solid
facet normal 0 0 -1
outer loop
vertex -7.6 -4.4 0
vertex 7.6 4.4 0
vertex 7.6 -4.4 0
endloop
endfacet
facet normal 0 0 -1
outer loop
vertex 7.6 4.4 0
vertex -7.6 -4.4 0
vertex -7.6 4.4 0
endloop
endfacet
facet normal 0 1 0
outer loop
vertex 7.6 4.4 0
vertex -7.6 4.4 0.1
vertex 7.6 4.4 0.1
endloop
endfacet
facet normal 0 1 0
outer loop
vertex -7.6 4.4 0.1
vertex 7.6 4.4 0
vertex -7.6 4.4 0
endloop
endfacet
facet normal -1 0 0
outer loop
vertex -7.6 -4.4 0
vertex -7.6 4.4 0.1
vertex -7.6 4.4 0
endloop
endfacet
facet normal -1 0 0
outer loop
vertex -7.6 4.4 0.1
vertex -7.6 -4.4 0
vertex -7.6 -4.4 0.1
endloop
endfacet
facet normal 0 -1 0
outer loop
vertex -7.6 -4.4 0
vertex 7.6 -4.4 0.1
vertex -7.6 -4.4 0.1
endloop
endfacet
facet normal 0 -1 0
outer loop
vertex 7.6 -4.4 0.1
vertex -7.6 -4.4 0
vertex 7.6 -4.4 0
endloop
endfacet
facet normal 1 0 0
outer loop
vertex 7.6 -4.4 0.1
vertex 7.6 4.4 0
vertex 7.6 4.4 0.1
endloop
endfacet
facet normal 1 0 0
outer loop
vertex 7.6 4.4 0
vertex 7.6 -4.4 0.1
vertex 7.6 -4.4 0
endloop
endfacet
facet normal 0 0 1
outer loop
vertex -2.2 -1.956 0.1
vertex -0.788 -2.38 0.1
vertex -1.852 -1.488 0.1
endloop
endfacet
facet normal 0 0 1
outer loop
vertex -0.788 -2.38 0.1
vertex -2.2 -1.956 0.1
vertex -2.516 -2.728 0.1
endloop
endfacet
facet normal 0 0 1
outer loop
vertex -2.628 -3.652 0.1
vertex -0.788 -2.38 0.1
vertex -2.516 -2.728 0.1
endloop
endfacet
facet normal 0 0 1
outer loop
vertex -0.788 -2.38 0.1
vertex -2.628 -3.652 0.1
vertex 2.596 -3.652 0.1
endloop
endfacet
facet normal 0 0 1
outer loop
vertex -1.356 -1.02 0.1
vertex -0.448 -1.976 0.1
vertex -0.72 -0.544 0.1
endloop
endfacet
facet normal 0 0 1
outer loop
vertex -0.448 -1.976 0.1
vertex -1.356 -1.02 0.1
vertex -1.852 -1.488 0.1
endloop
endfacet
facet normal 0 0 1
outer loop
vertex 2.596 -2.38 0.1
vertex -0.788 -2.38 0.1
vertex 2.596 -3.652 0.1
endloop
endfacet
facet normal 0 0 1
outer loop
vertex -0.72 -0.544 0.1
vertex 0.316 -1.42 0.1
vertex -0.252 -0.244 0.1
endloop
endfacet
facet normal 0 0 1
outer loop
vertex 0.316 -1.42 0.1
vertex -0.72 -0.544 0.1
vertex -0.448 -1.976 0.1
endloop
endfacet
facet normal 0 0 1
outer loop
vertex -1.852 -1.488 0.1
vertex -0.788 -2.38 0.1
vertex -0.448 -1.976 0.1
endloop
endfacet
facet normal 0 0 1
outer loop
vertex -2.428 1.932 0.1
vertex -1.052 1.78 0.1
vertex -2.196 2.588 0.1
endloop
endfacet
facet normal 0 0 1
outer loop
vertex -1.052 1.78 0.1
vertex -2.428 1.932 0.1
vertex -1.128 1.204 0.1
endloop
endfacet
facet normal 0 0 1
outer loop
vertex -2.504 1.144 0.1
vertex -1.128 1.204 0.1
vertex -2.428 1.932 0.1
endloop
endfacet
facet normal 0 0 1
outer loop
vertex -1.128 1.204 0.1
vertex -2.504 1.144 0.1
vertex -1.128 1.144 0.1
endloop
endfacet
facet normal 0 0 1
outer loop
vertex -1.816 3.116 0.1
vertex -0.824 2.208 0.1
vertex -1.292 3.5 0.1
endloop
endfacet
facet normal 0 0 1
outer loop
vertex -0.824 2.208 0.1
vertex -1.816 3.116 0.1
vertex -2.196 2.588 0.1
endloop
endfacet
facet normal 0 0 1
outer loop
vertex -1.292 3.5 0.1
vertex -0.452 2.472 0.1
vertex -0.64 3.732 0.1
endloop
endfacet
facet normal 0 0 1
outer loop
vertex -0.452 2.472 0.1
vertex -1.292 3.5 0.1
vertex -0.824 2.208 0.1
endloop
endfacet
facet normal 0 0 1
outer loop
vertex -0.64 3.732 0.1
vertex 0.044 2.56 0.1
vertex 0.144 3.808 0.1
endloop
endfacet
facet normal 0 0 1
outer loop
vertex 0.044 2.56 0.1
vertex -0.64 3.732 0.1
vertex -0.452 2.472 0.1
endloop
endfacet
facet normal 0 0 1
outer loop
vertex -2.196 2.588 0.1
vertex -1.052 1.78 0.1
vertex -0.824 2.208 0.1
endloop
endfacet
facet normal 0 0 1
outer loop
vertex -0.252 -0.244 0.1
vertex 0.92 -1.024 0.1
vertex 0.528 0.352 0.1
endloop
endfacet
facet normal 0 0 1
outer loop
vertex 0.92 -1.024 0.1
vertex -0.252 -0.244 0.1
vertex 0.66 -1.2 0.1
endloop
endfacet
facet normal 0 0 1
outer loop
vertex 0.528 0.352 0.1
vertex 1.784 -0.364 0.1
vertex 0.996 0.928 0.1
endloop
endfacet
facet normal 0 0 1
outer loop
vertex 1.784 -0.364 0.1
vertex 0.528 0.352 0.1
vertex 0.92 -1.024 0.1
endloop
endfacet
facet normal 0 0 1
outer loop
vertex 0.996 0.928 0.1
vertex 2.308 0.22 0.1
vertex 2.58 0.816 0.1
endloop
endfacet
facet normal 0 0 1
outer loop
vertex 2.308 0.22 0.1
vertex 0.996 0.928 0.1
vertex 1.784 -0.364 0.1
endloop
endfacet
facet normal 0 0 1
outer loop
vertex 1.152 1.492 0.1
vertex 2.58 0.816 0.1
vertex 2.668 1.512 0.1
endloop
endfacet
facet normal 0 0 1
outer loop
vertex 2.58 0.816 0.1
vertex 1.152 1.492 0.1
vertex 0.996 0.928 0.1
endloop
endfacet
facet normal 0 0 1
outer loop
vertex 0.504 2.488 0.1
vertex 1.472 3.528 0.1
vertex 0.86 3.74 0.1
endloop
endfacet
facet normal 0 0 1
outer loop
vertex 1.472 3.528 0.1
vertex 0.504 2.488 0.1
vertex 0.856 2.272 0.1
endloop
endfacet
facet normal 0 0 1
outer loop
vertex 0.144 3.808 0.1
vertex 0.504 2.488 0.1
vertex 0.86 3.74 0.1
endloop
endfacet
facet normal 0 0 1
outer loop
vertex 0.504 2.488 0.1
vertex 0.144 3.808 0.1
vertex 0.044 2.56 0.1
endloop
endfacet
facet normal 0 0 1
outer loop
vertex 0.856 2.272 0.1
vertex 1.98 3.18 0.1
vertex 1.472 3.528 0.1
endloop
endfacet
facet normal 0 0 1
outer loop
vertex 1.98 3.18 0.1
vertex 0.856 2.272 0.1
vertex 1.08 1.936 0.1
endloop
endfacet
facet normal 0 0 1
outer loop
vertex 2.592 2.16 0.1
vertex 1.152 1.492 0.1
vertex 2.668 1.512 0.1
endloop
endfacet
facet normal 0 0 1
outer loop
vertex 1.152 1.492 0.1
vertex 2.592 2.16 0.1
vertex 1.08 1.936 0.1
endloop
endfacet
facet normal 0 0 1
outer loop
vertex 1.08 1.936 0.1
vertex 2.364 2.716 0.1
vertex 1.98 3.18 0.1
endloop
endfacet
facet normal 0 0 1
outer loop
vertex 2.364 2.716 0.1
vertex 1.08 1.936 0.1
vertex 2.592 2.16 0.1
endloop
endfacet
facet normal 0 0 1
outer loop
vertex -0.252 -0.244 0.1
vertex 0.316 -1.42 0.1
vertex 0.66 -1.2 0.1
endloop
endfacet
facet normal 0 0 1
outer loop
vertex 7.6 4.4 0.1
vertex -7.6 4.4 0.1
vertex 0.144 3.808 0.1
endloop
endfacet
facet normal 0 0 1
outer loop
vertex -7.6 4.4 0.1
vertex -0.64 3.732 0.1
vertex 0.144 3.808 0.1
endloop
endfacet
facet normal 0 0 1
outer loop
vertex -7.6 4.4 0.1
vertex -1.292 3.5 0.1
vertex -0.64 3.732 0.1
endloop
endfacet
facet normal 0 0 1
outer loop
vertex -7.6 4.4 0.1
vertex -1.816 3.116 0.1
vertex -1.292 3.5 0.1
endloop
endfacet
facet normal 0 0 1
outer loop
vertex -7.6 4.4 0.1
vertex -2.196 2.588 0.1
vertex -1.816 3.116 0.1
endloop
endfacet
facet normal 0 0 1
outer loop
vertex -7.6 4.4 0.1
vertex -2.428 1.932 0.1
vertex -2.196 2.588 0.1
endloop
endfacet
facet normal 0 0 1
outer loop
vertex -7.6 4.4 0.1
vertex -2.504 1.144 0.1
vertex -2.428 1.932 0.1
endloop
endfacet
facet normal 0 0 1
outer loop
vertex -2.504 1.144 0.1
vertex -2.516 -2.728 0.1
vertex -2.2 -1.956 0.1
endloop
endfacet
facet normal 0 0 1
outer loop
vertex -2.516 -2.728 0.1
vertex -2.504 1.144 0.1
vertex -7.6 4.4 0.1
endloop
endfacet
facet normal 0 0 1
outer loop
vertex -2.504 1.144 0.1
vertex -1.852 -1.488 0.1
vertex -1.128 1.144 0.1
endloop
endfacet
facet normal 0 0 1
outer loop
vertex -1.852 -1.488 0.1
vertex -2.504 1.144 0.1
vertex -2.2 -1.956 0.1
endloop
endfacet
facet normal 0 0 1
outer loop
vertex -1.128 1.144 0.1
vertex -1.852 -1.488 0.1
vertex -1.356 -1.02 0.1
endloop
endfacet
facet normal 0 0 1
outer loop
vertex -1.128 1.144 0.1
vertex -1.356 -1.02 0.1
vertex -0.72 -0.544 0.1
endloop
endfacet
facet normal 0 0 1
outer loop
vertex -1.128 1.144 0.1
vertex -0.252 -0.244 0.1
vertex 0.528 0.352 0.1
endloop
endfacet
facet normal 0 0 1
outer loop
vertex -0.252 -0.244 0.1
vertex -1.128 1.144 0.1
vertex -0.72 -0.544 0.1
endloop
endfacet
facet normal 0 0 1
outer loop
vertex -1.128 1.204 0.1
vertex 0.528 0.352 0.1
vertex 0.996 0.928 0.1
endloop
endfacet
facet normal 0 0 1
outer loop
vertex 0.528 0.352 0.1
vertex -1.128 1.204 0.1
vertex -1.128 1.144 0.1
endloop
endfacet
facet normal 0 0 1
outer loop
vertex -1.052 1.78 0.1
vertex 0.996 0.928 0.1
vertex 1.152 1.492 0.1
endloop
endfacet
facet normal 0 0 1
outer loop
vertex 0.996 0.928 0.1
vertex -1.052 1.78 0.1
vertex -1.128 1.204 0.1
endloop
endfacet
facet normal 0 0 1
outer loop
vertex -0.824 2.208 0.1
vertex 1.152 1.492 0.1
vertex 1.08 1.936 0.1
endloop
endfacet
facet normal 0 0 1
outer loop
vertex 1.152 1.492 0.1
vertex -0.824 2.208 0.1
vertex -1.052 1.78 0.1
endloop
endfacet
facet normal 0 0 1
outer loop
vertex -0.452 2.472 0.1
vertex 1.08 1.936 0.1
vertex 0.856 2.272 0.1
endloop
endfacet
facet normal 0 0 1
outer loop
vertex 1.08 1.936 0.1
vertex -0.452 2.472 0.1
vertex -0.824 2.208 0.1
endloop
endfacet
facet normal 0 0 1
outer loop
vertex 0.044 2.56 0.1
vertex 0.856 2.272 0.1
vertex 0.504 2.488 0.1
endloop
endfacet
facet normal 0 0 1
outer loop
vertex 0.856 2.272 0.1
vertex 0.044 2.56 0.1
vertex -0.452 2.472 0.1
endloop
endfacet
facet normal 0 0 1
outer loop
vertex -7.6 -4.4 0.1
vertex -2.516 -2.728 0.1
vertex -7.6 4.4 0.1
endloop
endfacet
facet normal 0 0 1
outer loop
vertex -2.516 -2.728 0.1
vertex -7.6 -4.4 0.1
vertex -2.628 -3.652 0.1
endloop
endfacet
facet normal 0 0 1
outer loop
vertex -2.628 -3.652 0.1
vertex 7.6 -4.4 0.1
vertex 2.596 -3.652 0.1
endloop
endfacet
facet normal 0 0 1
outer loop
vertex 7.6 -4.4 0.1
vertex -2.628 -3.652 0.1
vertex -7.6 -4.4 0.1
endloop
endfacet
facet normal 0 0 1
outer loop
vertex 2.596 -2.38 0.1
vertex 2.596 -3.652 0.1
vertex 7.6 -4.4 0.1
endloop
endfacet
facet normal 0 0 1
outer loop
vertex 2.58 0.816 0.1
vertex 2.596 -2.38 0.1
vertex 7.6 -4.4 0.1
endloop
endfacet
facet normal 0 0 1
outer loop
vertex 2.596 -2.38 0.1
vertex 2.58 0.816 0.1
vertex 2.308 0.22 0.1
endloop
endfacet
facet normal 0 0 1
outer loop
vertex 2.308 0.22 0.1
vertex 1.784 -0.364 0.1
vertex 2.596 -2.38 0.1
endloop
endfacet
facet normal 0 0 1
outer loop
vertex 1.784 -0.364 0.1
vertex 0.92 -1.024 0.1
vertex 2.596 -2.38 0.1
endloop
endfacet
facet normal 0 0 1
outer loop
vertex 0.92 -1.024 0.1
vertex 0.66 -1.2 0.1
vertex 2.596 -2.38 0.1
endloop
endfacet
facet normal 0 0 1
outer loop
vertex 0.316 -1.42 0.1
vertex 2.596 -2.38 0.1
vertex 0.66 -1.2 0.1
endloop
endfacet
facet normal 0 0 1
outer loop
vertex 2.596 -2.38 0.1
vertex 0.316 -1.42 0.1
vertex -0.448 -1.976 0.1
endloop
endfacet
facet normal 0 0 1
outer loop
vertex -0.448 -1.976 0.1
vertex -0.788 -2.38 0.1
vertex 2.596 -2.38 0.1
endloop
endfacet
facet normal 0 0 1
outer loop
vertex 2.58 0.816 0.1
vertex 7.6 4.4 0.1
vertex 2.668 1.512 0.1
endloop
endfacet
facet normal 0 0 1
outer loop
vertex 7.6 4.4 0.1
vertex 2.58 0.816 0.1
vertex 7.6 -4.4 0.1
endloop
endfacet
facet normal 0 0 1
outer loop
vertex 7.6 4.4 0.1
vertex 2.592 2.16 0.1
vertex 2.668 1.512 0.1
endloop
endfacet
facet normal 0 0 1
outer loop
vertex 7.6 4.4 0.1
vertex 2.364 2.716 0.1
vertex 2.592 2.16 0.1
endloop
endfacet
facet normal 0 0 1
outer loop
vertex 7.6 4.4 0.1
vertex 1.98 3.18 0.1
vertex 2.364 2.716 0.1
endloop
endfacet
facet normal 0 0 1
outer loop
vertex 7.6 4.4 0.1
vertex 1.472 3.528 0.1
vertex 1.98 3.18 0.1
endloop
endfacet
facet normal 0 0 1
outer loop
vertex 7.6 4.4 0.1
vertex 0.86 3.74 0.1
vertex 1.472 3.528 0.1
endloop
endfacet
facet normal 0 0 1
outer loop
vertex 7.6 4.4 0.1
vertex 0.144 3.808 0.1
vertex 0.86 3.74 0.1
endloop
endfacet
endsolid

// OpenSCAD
// file: s/004452cs02.scad
use <../../lib.scad>
function ldraw_lib__s__004452cs02() = [
// 0 ~Sticker  1.1 x  1.9 with Number "2" - Background
// 0 Name: s\004452cs02.dat
// 0 Author: Takeshi Takahashi [RainbowDolphin]
// 0 !LDRAW_ORG Subpart UPDATE 2022-04
// 0 !LICENSE Licensed under CC BY 2.0 and CC BY 4.0 : see CAreadme.txt
// 
// 0 BFC CERTIFY CCW
  [0,"BFC","CERTIFY"],
  [0,"BFC","CCW"],
// 
// 0 !HISTORY 2022-07-18 [PTadmin] Official Update 2022-04
// 
// 
// 3 16 19 -.25 11 -19 -.25 11 .36 -.25 9.52
  [3,16,19,-.25,11,-19,-.25,11,.36,-.25,9.52],
// 3 16 -19 -.25 11 -1.6 -.25 9.33 .36 -.25 9.52
  [3,16,-19,-.25,11,-1.6,-.25,9.33,.36,-.25,9.52],
// 3 16 -19 -.25 11 -3.23 -.25 8.75 -1.6 -.25 9.33
  [3,16,-19,-.25,11,-3.23,-.25,8.75,-1.6,-.25,9.33],
// 3 16 -19 -.25 11 -4.54 -.25 7.79 -3.23 -.25 8.75
  [3,16,-19,-.25,11,-4.54,-.25,7.79,-3.23,-.25,8.75],
// 3 16 -19 -.25 11 -5.49 -.25 6.47 -4.54 -.25 7.79
  [3,16,-19,-.25,11,-5.49,-.25,6.47,-4.54,-.25,7.79],
// 3 16 -19 -.25 11 -6.07 -.25 4.83 -5.49 -.25 6.47
  [3,16,-19,-.25,11,-6.07,-.25,4.83,-5.49,-.25,6.47],
// 3 16 -19 -.25 11 -6.26 -.25 2.86 -6.07 -.25 4.83
  [3,16,-19,-.25,11,-6.26,-.25,2.86,-6.07,-.25,4.83],
// 4 16 -6.26 -.25 2.86 -19 -.25 11 -6.29 -.25 -6.82 -5.5 -.25 -4.89
  [4,16,-6.26,-.25,2.86,-19,-.25,11,-6.29,-.25,-6.82,-5.5,-.25,-4.89],
// 4 16 -6.26 -.25 2.86 -5.5 -.25 -4.89 -4.63 -.25 -3.72 -2.82 -.25 2.86
  [4,16,-6.26,-.25,2.86,-5.5,-.25,-4.89,-4.63,-.25,-3.72,-2.82,-.25,2.86],
// 3 16 -2.82 -.25 2.86 -4.63 -.25 -3.72 -3.39 -.25 -2.55
  [3,16,-2.82,-.25,2.86,-4.63,-.25,-3.72,-3.39,-.25,-2.55],
// 3 16 -2.82 -.25 2.86 -3.39 -.25 -2.55 -1.8 -.25 -1.36
  [3,16,-2.82,-.25,2.86,-3.39,-.25,-2.55,-1.8,-.25,-1.36],
// 4 16 -2.82 -.25 2.86 -1.8 -.25 -1.36 -.63 -.25 -.61 1.32 -.25 .88
  [4,16,-2.82,-.25,2.86,-1.8,-.25,-1.36,-.63,-.25,-.61,1.32,-.25,.88],
// 4 16 -2.82 -.25 3.01 -2.82 -.25 2.86 1.32 -.25 .88 2.49 -.25 2.32
  [4,16,-2.82,-.25,3.01,-2.82,-.25,2.86,1.32,-.25,.88,2.49,-.25,2.32],
// 4 16 -2.63 -.25 4.45 -2.82 -.25 3.01 2.49 -.25 2.32 2.88 -.25 3.73
  [4,16,-2.63,-.25,4.45,-2.82,-.25,3.01,2.49,-.25,2.32,2.88,-.25,3.73],
// 4 16 -2.06 -.25 5.52 -2.63 -.25 4.45 2.88 -.25 3.73 2.7 -.25 4.84
  [4,16,-2.06,-.25,5.52,-2.63,-.25,4.45,2.88,-.25,3.73,2.7,-.25,4.84],
// 4 16 -1.13 -.25 6.18 -2.06 -.25 5.52 2.7 -.25 4.84 2.14 -.25 5.68
  [4,16,-1.13,-.25,6.18,-2.06,-.25,5.52,2.7,-.25,4.84,2.14,-.25,5.68],
// 4 16 .11 -.25 6.4 -1.13 -.25 6.18 2.14 -.25 5.68 1.26 -.25 6.22
  [4,16,.11,-.25,6.4,-1.13,-.25,6.18,2.14,-.25,5.68,1.26,-.25,6.22],
// 4 16 -6.57 -.25 -9.13 -6.29 -.25 -6.82 -19 -.25 11 -19 -.25 -11
  [4,16,-6.57,-.25,-9.13,-6.29,-.25,-6.82,-19,-.25,11,-19,-.25,-11],
// 4 16 6.49 -.25 -9.13 -6.57 -.25 -9.13 -19 -.25 -11 19 -.25 -11
  [4,16,6.49,-.25,-9.13,-6.57,-.25,-9.13,-19,-.25,-11,19,-.25,-11],
// 3 16 6.49 -.25 -5.95 6.49 -.25 -9.13 19 -.25 -11
  [3,16,6.49,-.25,-5.95,6.49,-.25,-9.13,19,-.25,-11],
// 4 16 6.49 -.25 -5.95 19 -.25 -11 6.45 -.25 2.04 5.77 -.25 .55
  [4,16,6.49,-.25,-5.95,19,-.25,-11,6.45,-.25,2.04,5.77,-.25,.55],
// 3 16 5.77 -.25 .55 4.46 -.25 -.91 6.49 -.25 -5.95
  [3,16,5.77,-.25,.55,4.46,-.25,-.91,6.49,-.25,-5.95],
// 3 16 4.46 -.25 -.91 2.3 -.25 -2.56 6.49 -.25 -5.95
  [3,16,4.46,-.25,-.91,2.3,-.25,-2.56,6.49,-.25,-5.95],
// 3 16 2.3 -.25 -2.56 1.65 -.25 -3 6.49 -.25 -5.95
  [3,16,2.3,-.25,-2.56,1.65,-.25,-3,6.49,-.25,-5.95],
// 4 16 6.49 -.25 -5.95 1.65 -.25 -3 .79 -.25 -3.55 -1.12 -.25 -4.94
  [4,16,6.49,-.25,-5.95,1.65,-.25,-3,.79,-.25,-3.55,-1.12,-.25,-4.94],
// 3 16 -1.12 -.25 -4.94 -1.97 -.25 -5.95 6.49 -.25 -5.95
  [3,16,-1.12,-.25,-4.94,-1.97,-.25,-5.95,6.49,-.25,-5.95],
// 4 16 6.45 -.25 2.04 19 -.25 -11 19 -.25 11 6.67 -.25 3.78
  [4,16,6.45,-.25,2.04,19,-.25,-11,19,-.25,11,6.67,-.25,3.78],
// 3 16 19 -.25 11 6.48 -.25 5.4 6.67 -.25 3.78
  [3,16,19,-.25,11,6.48,-.25,5.4,6.67,-.25,3.78],
// 3 16 19 -.25 11 5.91 -.25 6.79 6.48 -.25 5.4
  [3,16,19,-.25,11,5.91,-.25,6.79,6.48,-.25,5.4],
// 3 16 19 -.25 11 4.95 -.25 7.95 5.91 -.25 6.79
  [3,16,19,-.25,11,4.95,-.25,7.95,5.91,-.25,6.79],
// 3 16 19 -.25 11 3.68 -.25 8.82 4.95 -.25 7.95
  [3,16,19,-.25,11,3.68,-.25,8.82,4.95,-.25,7.95],
// 3 16 19 -.25 11 2.15 -.25 9.35 3.68 -.25 8.82
  [3,16,19,-.25,11,2.15,-.25,9.35,3.68,-.25,8.82],
// 3 16 19 -.25 11 .36 -.25 9.52 2.15 -.25 9.35
  [3,16,19,-.25,11,.36,-.25,9.52,2.15,-.25,9.35],
];
makepoly(ldraw_lib__s__004452cs02(), line=0.2);
// file: s/004452cs01.scad
use <../../lib.scad>
function ldraw_lib__s__004452cs01() = [
// 0 ~Sticker  1.1 x  1.9 with Number "2" - Type Face
// 0 Name: s\004452cs01.dat
// 0 Author: Takeshi Takahashi [RainbowDolphin]
// 0 !LDRAW_ORG Subpart UPDATE 2022-04
// 0 !LICENSE Licensed under CC BY 2.0 and CC BY 4.0 : see CAreadme.txt
// 
// 0 BFC CERTIFY CCW
  [0,"BFC","CERTIFY"],
  [0,"BFC","CCW"],
// 
// 0 !HISTORY 2022-07-18 [PTadmin] Official Update 2022-04
// 
// 
// 4 16 -5.5 -.25 -4.89 -6.29 -.25 -6.82 -1.97 -.25 -5.95 -4.63 -.25 -3.72
  [4,16,-5.5,-.25,-4.89,-6.29,-.25,-6.82,-1.97,-.25,-5.95,-4.63,-.25,-3.72],
// 4 16 -1.97 -.25 -5.95 -6.29 -.25 -6.82 -6.57 -.25 -9.13 6.49 -.25 -9.13
  [4,16,-1.97,-.25,-5.95,-6.29,-.25,-6.82,-6.57,-.25,-9.13,6.49,-.25,-9.13],
// 4 16 -3.39 -.25 -2.55 -4.63 -.25 -3.72 -1.12 -.25 -4.94 -1.8 -.25 -1.36
  [4,16,-3.39,-.25,-2.55,-4.63,-.25,-3.72,-1.12,-.25,-4.94,-1.8,-.25,-1.36],
// 3 16 6.49 -.25 -5.95 -1.97 -.25 -5.95 6.49 -.25 -9.13
  [3,16,6.49,-.25,-5.95,-1.97,-.25,-5.95,6.49,-.25,-9.13],
// 4 16 .79 -.25 -3.55 -.63 -.25 -.61 -1.8 -.25 -1.36 -1.12 -.25 -4.94
  [4,16,.79,-.25,-3.55,-.63,-.25,-.61,-1.8,-.25,-1.36,-1.12,-.25,-4.94],
// 3 16 -4.63 -.25 -3.72 -1.97 -.25 -5.95 -1.12 -.25 -4.94
  [3,16,-4.63,-.25,-3.72,-1.97,-.25,-5.95,-1.12,-.25,-4.94],
// 4 16 -2.63 -.25 4.45 -5.49 -.25 6.47 -6.07 -.25 4.83 -2.82 -.25 3.01
  [4,16,-2.63,-.25,4.45,-5.49,-.25,6.47,-6.07,-.25,4.83,-2.82,-.25,3.01],
// 4 16 -6.26 -.25 2.86 -2.82 -.25 2.86 -2.82 -.25 3.01 -6.07 -.25 4.83
  [4,16,-6.26,-.25,2.86,-2.82,-.25,2.86,-2.82,-.25,3.01,-6.07,-.25,4.83],
// 4 16 -4.54 -.25 7.79 -5.49 -.25 6.47 -2.06 -.25 5.52 -3.23 -.25 8.75
  [4,16,-4.54,-.25,7.79,-5.49,-.25,6.47,-2.06,-.25,5.52,-3.23,-.25,8.75],
// 4 16 -3.23 -.25 8.75 -2.06 -.25 5.52 -1.13 -.25 6.18 -1.6 -.25 9.33
  [4,16,-3.23,-.25,8.75,-2.06,-.25,5.52,-1.13,-.25,6.18,-1.6,-.25,9.33],
// 4 16 -1.6 -.25 9.33 -1.13 -.25 6.18 .11 -.25 6.4 .36 -.25 9.52
  [4,16,-1.6,-.25,9.33,-1.13,-.25,6.18,.11,-.25,6.4,.36,-.25,9.52],
// 3 16 -5.49 -.25 6.47 -2.63 -.25 4.45 -2.06 -.25 5.52
  [3,16,-5.49,-.25,6.47,-2.63,-.25,4.45,-2.06,-.25,5.52],
// 4 16 -.63 -.25 -.61 1.65 -.25 -3 2.3 -.25 -2.56 1.32 -.25 .88
  [4,16,-.63,-.25,-.61,1.65,-.25,-3,2.3,-.25,-2.56,1.32,-.25,.88],
// 4 16 4.46 -.25 -.91 2.49 -.25 2.32 1.32 -.25 .88 2.3 -.25 -2.56
  [4,16,4.46,-.25,-.91,2.49,-.25,2.32,1.32,-.25,.88,2.3,-.25,-2.56],
// 4 16 5.77 -.25 .55 6.45 -.25 2.04 2.49 -.25 2.32 4.46 -.25 -.91
  [4,16,5.77,-.25,.55,6.45,-.25,2.04,2.49,-.25,2.32,4.46,-.25,-.91],
// 4 16 2.88 -.25 3.73 2.49 -.25 2.32 6.45 -.25 2.04 6.67 -.25 3.78
  [4,16,2.88,-.25,3.73,2.49,-.25,2.32,6.45,-.25,2.04,6.67,-.25,3.78],
// 4 16 1.26 -.25 6.22 2.14 -.25 5.68 3.68 -.25 8.82 2.15 -.25 9.35
  [4,16,1.26,-.25,6.22,2.14,-.25,5.68,3.68,-.25,8.82,2.15,-.25,9.35],
// 4 16 1.26 -.25 6.22 2.15 -.25 9.35 .36 -.25 9.52 .11 -.25 6.4
  [4,16,1.26,-.25,6.22,2.15,-.25,9.35,.36,-.25,9.52,.11,-.25,6.4],
// 4 16 2.14 -.25 5.68 2.7 -.25 4.84 4.95 -.25 7.95 3.68 -.25 8.82
  [4,16,2.14,-.25,5.68,2.7,-.25,4.84,4.95,-.25,7.95,3.68,-.25,8.82],
// 4 16 2.88 -.25 3.73 6.67 -.25 3.78 6.48 -.25 5.4 2.7 -.25 4.84
  [4,16,2.88,-.25,3.73,6.67,-.25,3.78,6.48,-.25,5.4,2.7,-.25,4.84],
// 4 16 2.7 -.25 4.84 6.48 -.25 5.4 5.91 -.25 6.79 4.95 -.25 7.95
  [4,16,2.7,-.25,4.84,6.48,-.25,5.4,5.91,-.25,6.79,4.95,-.25,7.95],
// 3 16 -.63 -.25 -.61 .79 -.25 -3.55 1.65 -.25 -3
  [3,16,-.63,-.25,-.61,.79,-.25,-3.55,1.65,-.25,-3],
];
makepoly(ldraw_lib__s__004452cs01(), line=0.2);
// file: ../p/box5-12.scad
use <../lib.scad>
function ldraw_lib__box5_12() = [
// 0 Box with 5 Faces without Any Edges
// 0 Name: box5-12.dat
// 0 Author: Chris Dee [cwdee]
// 0 !LDRAW_ORG Primitive UPDATE 2009-02
// 0 !LICENSE Licensed under CC BY 2.0 and CC BY 4.0 : see CAreadme.txt
// 
// 0 BFC CERTIFY CCW
  [0,"BFC","CERTIFY"],
  [0,"BFC","CCW"],
// 
// 0 !HISTORY 2009-09-03 [PTadmin] Official Update 2009-02
// 
// 
// 4 16 1 1 1 1 1 -1 -1 1 -1 -1 1 1
  [4,16,1,1,1,1,1,-1,-1,1,-1,-1,1,1],
// 4 16 -1 0 1 1 0 1 1 1 1 -1 1 1
  [4,16,-1,0,1,1,0,1,1,1,1,-1,1,1],
// 4 16 -1 0 -1 -1 0 1 -1 1 1 -1 1 -1
  [4,16,-1,0,-1,-1,0,1,-1,1,1,-1,1,-1],
// 4 16 1 0 -1 -1 0 -1 -1 1 -1 1 1 -1
  [4,16,1,0,-1,-1,0,-1,-1,1,-1,1,1,-1],
// 4 16 1 0 1 1 0 -1 1 1 -1 1 1 1
  [4,16,1,0,1,1,0,-1,1,1,-1,1,1,1],
// 0
];
makepoly(ldraw_lib__box5_12(), line=0.2);
// main file
use <../lib.scad>
use <../p/box5-12.scad>
use <s/004452cs01.scad>
use <s/004452cs02.scad>
function ldraw_lib__004659g() = [
// 0 Sticker  1.1 x  1.9 with White Number "2" on Red Background
// 0 Name: 004659g.dat
// 0 Author: Alex Taylor [anathema]
// 0 !LDRAW_ORG Part UPDATE 2022-04
// 0 !LICENSE Licensed under CC BY 2.0 and CC BY 4.0 : see CAreadme.txt
// 
// 0 BFC CERTIFY CCW
  [0,"BFC","CERTIFY"],
  [0,"BFC","CCW"],
// 
// 0 !KEYWORDS Fire Station, Set 590-1
// 
// 0 !HISTORY 2019-09-08 [anathema] Original pattern using TEXMAP
// 0 !HISTORY 2021-03-09 [RainbowDolphin] Vectorized the pattern and used common subfile with 004452c
// 0 !HISTORY 2022-07-18 [PTadmin] Official Update 2022-04
// 
// 
// 1 16 0 -0.25 0 19 0 0 0 0.25 0 0 0 11 box5-12.dat
  [1,16,0,-0.25,0,19,0,0,0,0.25,0,0,0,11, ldraw_lib__box5_12()],
// 1 15 0 0 0 1 0 0 0 1 0 0 0 1 s\004452cs01.dat
  [1,15,0,0,0,1,0,0,0,1,0,0,0,1, ldraw_lib__s__004452cs01()],
// 1 4 0 0 0 1 0 0 0 1 0 0 0 1 s\004452cs02.dat
  [1,4,0,0,0,1,0,0,0,1,0,0,0,1, ldraw_lib__s__004452cs02()],
];
makepoly(ldraw_lib__004659g(), line=0.2);
